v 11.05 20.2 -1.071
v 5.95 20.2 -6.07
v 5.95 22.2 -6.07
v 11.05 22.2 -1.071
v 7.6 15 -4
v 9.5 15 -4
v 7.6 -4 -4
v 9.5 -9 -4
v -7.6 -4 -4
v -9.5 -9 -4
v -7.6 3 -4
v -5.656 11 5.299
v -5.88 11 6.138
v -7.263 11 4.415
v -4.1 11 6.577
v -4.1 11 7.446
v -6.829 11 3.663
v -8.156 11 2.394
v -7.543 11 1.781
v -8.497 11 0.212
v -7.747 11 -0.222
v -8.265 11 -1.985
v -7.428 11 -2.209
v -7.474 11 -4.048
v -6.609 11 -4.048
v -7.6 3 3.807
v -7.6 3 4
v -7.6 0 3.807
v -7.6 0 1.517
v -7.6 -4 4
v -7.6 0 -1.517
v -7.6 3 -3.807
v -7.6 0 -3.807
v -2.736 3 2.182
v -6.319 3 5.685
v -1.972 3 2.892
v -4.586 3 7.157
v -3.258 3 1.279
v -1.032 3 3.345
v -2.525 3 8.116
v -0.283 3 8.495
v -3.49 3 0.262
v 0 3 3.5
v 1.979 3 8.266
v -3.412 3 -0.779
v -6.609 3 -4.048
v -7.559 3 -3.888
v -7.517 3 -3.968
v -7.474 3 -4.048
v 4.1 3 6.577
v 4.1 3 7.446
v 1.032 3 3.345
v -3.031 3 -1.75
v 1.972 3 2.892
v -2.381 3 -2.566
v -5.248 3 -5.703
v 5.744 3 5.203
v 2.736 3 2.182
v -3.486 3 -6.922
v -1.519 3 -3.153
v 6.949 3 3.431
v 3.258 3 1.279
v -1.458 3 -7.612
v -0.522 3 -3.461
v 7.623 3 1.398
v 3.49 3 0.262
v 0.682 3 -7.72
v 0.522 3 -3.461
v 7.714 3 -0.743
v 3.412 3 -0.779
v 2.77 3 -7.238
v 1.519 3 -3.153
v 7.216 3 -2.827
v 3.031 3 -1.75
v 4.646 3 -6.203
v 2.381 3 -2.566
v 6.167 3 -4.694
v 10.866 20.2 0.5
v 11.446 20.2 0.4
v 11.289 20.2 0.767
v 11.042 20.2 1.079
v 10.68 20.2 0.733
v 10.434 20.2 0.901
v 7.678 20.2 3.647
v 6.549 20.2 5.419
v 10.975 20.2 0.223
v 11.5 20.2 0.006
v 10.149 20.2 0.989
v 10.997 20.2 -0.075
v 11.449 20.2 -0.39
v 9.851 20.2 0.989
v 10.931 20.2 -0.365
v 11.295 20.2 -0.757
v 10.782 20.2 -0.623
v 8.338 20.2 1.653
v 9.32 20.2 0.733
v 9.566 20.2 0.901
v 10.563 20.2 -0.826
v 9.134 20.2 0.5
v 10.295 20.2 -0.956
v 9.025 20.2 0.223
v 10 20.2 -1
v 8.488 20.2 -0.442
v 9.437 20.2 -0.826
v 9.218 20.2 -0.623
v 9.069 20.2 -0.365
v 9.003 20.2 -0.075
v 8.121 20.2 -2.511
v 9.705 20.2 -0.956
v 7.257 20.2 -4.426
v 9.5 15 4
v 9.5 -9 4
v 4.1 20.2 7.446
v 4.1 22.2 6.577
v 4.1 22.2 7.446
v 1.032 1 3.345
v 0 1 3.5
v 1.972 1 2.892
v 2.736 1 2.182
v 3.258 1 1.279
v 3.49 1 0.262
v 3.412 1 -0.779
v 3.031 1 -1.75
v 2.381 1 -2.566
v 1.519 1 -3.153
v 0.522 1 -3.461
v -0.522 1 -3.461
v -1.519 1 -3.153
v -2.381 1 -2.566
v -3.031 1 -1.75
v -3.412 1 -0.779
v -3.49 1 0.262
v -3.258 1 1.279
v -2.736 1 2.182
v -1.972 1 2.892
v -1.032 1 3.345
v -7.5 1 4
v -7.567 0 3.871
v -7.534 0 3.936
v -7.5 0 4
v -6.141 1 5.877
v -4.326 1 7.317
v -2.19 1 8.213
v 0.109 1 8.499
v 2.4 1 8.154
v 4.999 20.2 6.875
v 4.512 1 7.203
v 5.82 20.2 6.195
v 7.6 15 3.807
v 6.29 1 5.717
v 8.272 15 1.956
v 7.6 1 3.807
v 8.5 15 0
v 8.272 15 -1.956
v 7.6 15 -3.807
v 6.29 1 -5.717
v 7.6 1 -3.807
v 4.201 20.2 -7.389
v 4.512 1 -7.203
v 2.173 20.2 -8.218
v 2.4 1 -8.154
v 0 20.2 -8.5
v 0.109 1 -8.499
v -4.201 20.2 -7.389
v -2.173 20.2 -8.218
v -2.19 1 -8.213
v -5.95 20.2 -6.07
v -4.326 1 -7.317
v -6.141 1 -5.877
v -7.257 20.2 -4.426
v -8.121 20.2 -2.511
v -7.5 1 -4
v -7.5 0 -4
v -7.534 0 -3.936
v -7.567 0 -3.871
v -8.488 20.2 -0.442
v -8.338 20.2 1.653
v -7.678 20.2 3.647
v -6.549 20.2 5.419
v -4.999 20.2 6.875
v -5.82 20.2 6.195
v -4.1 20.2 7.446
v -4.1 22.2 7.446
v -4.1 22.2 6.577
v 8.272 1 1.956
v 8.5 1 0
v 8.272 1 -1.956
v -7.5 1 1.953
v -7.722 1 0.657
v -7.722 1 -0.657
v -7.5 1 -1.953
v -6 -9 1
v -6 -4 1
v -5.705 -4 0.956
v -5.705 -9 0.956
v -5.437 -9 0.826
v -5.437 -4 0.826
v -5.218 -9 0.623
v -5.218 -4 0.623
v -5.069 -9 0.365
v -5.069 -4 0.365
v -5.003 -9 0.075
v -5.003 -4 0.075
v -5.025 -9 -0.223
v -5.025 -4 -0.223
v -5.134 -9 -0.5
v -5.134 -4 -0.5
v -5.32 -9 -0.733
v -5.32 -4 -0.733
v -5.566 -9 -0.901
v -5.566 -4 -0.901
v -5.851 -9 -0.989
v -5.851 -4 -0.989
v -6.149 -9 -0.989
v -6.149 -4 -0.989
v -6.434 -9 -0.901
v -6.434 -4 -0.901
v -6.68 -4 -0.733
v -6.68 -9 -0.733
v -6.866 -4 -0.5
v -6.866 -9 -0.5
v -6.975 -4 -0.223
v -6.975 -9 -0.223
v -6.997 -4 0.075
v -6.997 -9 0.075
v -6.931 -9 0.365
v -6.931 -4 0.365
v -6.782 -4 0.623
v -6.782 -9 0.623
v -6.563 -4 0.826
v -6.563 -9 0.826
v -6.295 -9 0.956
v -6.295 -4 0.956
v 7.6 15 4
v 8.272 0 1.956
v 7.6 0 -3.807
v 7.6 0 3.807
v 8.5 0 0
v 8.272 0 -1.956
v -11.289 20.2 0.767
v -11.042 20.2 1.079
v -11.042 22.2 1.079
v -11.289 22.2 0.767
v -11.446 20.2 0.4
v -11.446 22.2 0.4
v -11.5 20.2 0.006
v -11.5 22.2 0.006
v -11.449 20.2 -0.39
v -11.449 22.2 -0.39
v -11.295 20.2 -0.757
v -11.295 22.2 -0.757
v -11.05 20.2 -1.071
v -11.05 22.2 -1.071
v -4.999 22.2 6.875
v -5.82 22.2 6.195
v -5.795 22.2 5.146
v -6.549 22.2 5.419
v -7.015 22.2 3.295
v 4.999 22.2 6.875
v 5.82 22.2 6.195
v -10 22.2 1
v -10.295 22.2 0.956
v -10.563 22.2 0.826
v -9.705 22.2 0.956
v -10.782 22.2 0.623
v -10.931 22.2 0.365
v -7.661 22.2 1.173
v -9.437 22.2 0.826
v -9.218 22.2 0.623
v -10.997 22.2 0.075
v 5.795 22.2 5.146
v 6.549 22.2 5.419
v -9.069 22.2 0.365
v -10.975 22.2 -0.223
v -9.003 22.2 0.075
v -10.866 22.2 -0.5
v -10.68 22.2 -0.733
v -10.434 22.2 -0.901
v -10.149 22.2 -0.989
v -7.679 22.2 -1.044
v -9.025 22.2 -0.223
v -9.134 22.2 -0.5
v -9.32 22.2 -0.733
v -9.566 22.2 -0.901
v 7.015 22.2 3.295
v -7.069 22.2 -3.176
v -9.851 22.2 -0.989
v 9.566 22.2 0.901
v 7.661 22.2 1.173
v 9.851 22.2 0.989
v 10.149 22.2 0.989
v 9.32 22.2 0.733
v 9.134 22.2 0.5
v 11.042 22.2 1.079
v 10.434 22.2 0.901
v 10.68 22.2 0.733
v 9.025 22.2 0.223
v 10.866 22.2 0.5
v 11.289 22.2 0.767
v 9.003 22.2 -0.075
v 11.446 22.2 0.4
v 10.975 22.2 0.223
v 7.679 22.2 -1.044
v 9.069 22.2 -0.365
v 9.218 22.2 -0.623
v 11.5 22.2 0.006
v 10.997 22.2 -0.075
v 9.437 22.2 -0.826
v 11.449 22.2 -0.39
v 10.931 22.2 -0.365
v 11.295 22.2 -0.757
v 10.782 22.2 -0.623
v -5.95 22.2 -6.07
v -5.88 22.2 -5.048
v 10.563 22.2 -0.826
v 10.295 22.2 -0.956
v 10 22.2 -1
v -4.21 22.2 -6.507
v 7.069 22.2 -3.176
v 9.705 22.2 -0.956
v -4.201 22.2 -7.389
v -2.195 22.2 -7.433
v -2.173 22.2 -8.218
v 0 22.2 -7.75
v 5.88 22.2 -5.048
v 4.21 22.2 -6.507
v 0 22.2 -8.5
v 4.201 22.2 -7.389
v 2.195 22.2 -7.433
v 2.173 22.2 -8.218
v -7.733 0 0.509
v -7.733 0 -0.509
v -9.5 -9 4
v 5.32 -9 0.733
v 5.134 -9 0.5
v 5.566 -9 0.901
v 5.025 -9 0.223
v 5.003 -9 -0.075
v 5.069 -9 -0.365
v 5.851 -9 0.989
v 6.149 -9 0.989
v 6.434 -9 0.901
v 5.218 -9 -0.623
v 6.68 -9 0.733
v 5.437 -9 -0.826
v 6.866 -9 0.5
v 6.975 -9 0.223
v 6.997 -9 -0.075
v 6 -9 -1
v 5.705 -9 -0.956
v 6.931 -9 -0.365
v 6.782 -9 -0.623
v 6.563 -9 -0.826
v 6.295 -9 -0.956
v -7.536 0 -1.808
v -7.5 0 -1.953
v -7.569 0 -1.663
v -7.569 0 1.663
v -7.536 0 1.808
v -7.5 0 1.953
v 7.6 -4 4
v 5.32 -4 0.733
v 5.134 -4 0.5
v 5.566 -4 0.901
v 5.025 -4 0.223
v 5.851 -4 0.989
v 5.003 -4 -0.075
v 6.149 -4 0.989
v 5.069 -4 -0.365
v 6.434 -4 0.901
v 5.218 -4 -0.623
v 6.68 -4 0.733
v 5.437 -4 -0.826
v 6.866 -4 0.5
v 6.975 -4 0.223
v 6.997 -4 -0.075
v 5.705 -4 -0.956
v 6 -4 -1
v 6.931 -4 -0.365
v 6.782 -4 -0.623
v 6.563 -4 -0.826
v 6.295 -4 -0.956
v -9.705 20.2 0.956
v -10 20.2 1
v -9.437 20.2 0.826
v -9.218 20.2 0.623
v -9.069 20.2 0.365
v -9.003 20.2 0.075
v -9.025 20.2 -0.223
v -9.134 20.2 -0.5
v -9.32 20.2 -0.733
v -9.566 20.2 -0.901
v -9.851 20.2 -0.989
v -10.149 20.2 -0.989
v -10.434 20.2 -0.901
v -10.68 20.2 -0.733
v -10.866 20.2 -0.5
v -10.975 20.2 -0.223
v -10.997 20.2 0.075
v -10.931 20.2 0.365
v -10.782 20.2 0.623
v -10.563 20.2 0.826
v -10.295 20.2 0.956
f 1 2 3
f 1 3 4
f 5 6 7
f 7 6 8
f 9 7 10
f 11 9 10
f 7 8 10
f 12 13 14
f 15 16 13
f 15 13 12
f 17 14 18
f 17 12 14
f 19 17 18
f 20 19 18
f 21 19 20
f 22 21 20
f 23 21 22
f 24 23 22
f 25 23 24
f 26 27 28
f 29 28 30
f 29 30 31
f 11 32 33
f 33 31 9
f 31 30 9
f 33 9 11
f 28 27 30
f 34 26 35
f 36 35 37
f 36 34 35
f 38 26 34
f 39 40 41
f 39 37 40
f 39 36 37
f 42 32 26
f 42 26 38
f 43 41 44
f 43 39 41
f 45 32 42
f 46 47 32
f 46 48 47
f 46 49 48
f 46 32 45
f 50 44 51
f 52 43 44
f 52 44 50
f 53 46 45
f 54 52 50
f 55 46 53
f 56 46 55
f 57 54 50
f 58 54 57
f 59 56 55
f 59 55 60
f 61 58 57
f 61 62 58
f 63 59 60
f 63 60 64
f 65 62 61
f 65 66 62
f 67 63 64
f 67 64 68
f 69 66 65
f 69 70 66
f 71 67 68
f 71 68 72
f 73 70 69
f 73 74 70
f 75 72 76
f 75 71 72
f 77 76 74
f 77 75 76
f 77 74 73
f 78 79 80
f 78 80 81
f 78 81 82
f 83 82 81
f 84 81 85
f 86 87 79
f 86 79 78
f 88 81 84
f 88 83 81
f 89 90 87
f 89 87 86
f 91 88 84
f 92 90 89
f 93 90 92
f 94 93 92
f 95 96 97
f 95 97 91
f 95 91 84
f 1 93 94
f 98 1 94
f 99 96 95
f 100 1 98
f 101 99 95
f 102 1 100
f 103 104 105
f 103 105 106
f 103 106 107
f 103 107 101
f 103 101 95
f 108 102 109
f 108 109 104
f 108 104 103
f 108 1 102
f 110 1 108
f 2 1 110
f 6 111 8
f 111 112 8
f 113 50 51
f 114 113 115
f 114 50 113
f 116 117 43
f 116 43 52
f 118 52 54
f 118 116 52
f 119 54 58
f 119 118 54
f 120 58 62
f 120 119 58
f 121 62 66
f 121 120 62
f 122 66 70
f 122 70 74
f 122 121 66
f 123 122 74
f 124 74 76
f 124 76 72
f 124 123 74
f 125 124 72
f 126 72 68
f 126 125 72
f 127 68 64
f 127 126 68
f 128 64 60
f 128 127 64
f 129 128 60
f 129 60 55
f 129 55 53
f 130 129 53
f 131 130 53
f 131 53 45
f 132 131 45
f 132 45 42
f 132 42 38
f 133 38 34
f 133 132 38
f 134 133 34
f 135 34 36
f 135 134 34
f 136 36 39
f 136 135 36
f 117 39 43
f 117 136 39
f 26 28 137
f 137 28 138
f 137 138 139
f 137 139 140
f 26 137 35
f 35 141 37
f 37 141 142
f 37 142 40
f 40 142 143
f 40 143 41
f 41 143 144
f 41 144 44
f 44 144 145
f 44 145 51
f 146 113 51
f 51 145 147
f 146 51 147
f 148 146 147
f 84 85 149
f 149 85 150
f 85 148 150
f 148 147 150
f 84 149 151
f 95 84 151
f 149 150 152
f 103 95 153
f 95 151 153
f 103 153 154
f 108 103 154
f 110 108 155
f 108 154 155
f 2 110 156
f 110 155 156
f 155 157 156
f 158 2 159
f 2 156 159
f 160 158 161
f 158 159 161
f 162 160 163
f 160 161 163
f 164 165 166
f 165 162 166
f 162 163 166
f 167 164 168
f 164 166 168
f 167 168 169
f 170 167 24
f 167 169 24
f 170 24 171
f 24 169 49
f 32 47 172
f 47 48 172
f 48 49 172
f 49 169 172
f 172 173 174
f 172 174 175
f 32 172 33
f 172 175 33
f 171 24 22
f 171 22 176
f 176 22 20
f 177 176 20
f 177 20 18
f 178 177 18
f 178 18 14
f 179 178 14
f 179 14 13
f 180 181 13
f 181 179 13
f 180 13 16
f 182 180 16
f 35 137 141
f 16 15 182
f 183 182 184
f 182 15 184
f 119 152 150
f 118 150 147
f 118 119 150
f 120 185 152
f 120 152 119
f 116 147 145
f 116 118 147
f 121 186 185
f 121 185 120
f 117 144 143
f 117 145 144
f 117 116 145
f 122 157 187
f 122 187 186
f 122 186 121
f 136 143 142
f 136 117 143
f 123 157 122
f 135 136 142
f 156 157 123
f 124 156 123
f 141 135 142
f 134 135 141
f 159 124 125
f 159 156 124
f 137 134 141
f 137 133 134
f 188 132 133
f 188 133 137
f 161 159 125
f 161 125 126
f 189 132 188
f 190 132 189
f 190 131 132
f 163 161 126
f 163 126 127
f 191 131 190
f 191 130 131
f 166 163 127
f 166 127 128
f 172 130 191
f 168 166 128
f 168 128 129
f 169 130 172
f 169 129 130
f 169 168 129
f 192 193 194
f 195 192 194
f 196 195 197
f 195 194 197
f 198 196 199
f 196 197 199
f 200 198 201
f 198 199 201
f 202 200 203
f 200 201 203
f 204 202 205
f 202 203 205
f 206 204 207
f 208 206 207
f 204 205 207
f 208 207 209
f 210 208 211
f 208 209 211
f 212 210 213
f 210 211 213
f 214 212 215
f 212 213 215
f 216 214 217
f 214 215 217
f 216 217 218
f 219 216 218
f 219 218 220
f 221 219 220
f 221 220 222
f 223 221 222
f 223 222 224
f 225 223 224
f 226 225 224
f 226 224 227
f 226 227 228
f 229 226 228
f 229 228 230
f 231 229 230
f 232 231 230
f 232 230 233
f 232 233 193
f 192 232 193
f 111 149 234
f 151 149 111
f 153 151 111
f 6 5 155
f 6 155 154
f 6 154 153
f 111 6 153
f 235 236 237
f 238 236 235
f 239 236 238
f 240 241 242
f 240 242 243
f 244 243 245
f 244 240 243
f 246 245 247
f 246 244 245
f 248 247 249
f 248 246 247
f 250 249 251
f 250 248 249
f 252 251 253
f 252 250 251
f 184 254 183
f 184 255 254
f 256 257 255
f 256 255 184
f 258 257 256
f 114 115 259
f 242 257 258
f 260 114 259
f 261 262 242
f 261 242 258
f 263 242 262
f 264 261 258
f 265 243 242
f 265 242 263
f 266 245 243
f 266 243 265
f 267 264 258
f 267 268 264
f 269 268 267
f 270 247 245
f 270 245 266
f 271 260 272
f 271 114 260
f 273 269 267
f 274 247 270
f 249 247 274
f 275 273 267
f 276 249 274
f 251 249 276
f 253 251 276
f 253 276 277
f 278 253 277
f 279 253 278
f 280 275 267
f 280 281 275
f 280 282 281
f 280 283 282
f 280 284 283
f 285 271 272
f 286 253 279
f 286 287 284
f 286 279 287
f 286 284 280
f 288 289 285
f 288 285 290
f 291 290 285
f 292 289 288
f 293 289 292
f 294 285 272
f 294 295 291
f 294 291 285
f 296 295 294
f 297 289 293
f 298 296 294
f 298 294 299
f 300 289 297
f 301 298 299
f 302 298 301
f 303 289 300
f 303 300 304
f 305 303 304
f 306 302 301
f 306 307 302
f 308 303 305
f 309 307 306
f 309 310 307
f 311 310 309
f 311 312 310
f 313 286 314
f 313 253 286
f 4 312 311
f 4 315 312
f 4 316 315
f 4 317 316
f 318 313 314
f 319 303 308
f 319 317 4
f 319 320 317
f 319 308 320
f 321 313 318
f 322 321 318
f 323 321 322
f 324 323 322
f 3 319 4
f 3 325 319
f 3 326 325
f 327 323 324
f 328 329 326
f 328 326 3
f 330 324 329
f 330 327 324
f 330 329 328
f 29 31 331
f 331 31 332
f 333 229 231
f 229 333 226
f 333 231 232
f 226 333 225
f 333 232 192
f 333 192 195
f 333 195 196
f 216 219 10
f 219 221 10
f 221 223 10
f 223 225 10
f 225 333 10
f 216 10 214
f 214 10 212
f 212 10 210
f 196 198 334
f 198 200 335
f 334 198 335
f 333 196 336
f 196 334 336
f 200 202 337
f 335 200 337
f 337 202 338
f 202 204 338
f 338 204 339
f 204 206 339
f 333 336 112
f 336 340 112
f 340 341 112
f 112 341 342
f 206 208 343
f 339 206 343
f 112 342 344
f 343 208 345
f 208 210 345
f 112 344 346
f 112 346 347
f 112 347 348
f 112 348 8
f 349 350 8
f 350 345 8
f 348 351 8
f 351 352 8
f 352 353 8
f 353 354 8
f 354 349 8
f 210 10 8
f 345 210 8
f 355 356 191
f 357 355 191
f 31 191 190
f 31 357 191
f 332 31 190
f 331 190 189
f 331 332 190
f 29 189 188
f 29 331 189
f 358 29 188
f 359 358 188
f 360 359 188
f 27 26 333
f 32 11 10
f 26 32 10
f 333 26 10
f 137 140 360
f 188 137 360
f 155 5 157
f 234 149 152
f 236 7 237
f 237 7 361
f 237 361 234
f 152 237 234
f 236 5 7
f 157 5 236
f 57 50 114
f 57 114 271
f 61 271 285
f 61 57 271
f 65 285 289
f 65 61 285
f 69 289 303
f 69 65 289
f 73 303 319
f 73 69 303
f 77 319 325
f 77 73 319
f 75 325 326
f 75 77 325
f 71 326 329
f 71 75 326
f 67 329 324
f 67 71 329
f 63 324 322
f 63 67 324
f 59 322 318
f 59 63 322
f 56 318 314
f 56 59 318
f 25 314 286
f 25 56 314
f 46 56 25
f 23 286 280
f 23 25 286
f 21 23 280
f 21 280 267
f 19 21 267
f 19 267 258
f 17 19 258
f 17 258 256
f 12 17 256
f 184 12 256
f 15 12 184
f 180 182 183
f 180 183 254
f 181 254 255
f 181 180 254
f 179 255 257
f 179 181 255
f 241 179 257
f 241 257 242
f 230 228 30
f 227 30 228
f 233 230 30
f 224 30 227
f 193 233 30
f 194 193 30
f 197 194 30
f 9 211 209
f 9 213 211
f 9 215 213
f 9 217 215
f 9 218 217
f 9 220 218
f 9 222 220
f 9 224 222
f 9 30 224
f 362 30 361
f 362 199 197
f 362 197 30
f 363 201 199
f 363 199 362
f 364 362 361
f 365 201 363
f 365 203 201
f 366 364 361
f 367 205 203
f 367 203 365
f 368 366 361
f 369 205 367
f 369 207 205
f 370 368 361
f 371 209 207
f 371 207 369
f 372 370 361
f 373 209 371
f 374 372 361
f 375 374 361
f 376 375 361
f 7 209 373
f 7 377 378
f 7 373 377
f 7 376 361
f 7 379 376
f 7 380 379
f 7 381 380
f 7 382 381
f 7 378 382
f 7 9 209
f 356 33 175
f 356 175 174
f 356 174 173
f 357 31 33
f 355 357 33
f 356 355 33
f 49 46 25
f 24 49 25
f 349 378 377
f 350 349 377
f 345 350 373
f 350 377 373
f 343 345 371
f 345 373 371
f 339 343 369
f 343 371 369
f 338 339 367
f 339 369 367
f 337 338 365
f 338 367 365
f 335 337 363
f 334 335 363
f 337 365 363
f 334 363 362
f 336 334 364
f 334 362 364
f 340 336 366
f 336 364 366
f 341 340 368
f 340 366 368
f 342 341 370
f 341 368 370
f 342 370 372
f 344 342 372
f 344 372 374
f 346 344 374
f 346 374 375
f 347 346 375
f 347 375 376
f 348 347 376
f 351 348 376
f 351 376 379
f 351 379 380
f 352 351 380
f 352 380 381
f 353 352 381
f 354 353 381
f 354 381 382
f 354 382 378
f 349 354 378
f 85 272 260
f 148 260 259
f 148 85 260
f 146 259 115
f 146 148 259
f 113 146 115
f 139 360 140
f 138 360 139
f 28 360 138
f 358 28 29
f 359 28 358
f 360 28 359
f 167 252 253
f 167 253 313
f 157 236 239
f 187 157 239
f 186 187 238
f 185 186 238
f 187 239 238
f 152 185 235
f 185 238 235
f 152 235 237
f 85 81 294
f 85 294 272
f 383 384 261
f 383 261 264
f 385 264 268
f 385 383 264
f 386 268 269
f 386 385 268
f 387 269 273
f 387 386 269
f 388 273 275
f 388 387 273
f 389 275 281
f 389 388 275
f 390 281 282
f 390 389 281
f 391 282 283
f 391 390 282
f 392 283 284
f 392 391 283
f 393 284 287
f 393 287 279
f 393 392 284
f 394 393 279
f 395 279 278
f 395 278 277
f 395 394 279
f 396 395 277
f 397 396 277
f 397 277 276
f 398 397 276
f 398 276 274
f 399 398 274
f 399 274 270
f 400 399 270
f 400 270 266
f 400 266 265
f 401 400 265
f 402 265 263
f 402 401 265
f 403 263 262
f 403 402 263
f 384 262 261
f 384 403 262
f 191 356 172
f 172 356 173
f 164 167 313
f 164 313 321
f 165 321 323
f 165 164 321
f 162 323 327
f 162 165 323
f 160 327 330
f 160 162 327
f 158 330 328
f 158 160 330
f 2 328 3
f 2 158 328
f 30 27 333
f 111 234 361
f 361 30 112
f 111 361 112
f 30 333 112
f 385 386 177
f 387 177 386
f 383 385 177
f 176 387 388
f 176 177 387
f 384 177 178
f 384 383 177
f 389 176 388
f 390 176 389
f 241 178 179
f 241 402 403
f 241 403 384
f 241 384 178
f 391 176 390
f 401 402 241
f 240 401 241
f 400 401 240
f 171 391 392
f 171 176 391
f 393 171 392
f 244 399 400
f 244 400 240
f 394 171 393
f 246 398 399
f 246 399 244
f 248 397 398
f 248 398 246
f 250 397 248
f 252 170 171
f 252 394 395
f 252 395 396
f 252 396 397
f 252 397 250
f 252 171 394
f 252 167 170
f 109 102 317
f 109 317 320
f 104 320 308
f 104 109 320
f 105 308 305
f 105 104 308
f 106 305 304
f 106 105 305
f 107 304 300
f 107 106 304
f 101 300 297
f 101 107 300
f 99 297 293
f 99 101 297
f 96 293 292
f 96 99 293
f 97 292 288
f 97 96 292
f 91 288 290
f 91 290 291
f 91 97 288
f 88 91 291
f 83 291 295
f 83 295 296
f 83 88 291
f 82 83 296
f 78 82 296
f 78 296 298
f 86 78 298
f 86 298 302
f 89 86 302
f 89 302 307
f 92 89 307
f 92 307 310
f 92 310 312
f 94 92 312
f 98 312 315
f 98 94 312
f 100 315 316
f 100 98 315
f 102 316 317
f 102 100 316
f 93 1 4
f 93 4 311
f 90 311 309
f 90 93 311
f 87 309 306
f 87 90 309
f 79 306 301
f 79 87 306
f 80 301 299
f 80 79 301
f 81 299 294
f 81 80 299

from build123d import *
from build123d.topology import SkipClean

# Parameters (mm, degrees)
SKETCH_2_W                = 19
SKETCH_2_H                = 8
EXTRUDE_1_DEPTH           = 9
SKETCH_4_R                = 8.5
EXTRUDE_2_DEPTH           = 22.2
CUT_EXTRUDE_5_REACH       = 27.6
SKETCH_5_2_R              = 7.75
EXTRUDE_START             = -2
SKETCH_9_R                = 1
EXTRUDE_4_DEPTH           = 2
SKETCH_5_R                = 7.75
CUT_EXTRUDE_8_DEPTH       = 27.407196
SKETCH_11_W               = 15.2
SKETCH_11_H               = 8
CUT_EXTRUDE_11_DEPTH      = 4
SKETCH_12_W               = 8.2
SKETCH_12_H               = 22.2
CUT_EXTRUDE_12_DEPTH      = 27.407196
SKETCH_13_W               = 11.493961
SKETCH_13_H               = 8
CUT_EXTRUDE_13_DEPTH      = 27.407196
EXTRUDE_6_DEPTH           = 3
EXTRUDE_7_DEPTH           = 15
SKETCH_16_R               = 1
CUT_EXTRUDE_14_DEPTH      = 30.848618
SKETCH_17_R               = 8.5
SKETCH_17_R_2             = 3.5
EXTRUDE_8_DEPTH           = 2
CUT_EXTRUDE_15_DEPTH      = 27.407196
CUT_EXTRUDE_15_DEPTH_BACK = 27.407196
CUT_EXTRUDE_17_DEPTH      = 1


with BuildPart() as part:
    # 草图2 → 凸台-拉伸1 (new body)
    with BuildSketch(Plane(origin=(0, 0, 0), x_dir=(1, 0, 0), z_dir=(0, 1, 0))):
        Rectangle(SKETCH_2_W, SKETCH_2_H)
    extrude(amount=-EXTRUDE_1_DEPTH)

    # 草图4 → 凸台-拉伸2 (add)
    with BuildSketch(Plane(origin=(0, 0, 0), x_dir=(1, 0, 0), z_dir=(0, 1, 0))):
        Circle(SKETCH_4_R)
    extrude(amount=EXTRUDE_2_DEPTH)

    # 草图5<2> → 切除-拉伸5 (cut, up to next)
    with BuildSketch(Plane(origin=(0, 0, 0), x_dir=(1, 0, 0), z_dir=(0, 1, 0)), mode=Mode.PRIVATE) as cut_extrude_5_sk1:
        Circle(SKETCH_5_2_R)
    cut_extrude_5_tool1 = extrude(cut_extrude_5_sk1.sketch, amount=CUT_EXTRUDE_5_REACH, mode=Mode.PRIVATE) & part.part
    add(cut_extrude_5_tool1.solids().sort_by_distance((0, 0, 0))[0], mode=Mode.SUBTRACT)

    # 草图9 → 凸台-拉伸4 (add)
    with SkipClean():  # the faces are left unmerged after this step: merging them gives an invalid solid
        with BuildSketch(Plane(origin=(0, 22.2, 0), x_dir=(1, 0, 0), z_dir=(0, 1, 0)).offset(EXTRUDE_START)):
            with BuildLine():
                Line((-11.05, 1.071214), (-5.95, 6.070214))
                ThreePointArc((-5.95, 6.070214), (0, 8.5), (5.95, 6.070214))
                Line((5.95, 6.070214), (11.05, 1.071214))
                ThreePointArc((11.05, 1.071214), (11.49999, -0.005522), (11.042085, -1.078916))
                Line((11.042085, -1.078916), (6.548688, -5.418919))
                ThreePointArc((6.548688, -5.418919), (0, -8.5), (-6.548688, -5.418919))
                Line((-6.548688, -5.418919), (-11.042085, -1.078916))
                ThreePointArc((-11.042085, -1.078916), (-11.49999, -0.005522), (-11.05, 1.071214))
            make_face()
            with Locations((-10, 0)):
                Circle(SKETCH_9_R, mode=Mode.SUBTRACT)
            with Locations((10, 0)):
                Circle(SKETCH_9_R, mode=Mode.SUBTRACT)
        extrude(amount=EXTRUDE_4_DEPTH)

    # 草图5 → 切除-拉伸8 (cut, through all)
    with SkipClean():  # the faces are left unmerged after this step: merging them gives an invalid solid
        with BuildSketch(Plane(origin=(0, 0, 0), x_dir=(1, 0, 0), z_dir=(0, 1, 0))):
            Circle(SKETCH_5_R)
        extrude(amount=CUT_EXTRUDE_8_DEPTH, mode=Mode.SUBTRACT)

    # 草图11 → 切除-拉伸11 (cut)
    with SkipClean():  # the faces are left unmerged after this step: merging them gives an invalid solid
        with BuildSketch(Plane(origin=(0, 0, 0), x_dir=(1, 0, 0), z_dir=(0, 1, 0))):
            Rectangle(SKETCH_11_W, SKETCH_11_H)
        extrude(amount=-CUT_EXTRUDE_11_DEPTH, mode=Mode.SUBTRACT)

    # 草图12 → 切除-拉伸12 (cut, through all)
    with SkipClean():  # the faces are left unmerged after this step: merging them gives an invalid solid
        with BuildSketch(Plane.XY):
            with Locations((0, 11.1)):
                Rectangle(SKETCH_12_W, SKETCH_12_H)
        extrude(amount=CUT_EXTRUDE_12_DEPTH, mode=Mode.SUBTRACT)

    # 草图13 → 切除-拉伸13 (cut, through all)
    with SkipClean():  # the faces are left unmerged after this step: merging them gives an invalid solid
        with BuildSketch(Plane(origin=(0, 0, 0), x_dir=(0, 0, -1), z_dir=(1, 0, 0))):
            with Locations((-1.698824, 7)):
                Rectangle(SKETCH_13_W, SKETCH_13_H)
        extrude(amount=-CUT_EXTRUDE_13_DEPTH, mode=Mode.SUBTRACT)

    # 草图14 → 凸台-拉伸6 (add)
    with BuildSketch(Plane(origin=(0, 0, 0), x_dir=(1, 0, 0), z_dir=(0, 1, 0))):
        with BuildLine():
            Line((-7.6, 3.806573), (-7.6, 4))
            Line((-7.6, 4), (-9.5, 4))
            Line((-9.5, 4), (-9.5, -4))
            Line((-9.5, -4), (-7.6, -4))
            Line((-7.6, -4), (-7.6, -3.806573))
            ThreePointArc((-7.6, -3.806573), (-8.5, 0), (-7.6, 3.806573))
        make_face()
    extrude(amount=EXTRUDE_6_DEPTH)

    # 草图15 → 凸台-拉伸7 (add)
    with SkipClean():  # the faces are left unmerged after this step: merging them gives an invalid solid
        with BuildSketch(Plane(origin=(0, 0, 0), x_dir=(1, 0, 0), z_dir=(0, 1, 0))):
            with BuildLine():
                Line((7.6, -3.806573), (7.6, -4))
                Line((7.6, -4), (9.5, -4))
                Line((9.5, -4), (9.5, 4))
                Line((9.5, 4), (7.6, 4))
                Line((7.6, 4), (7.6, 3.806573))
                ThreePointArc((7.6, 3.806573), (8.5, 0), (7.6, -3.806573))
            make_face()
        extrude(amount=EXTRUDE_7_DEPTH)

    # 草图16 → 切除-拉伸14 (cut, through all)
    with SkipClean():  # the faces are left unmerged after this step: merging them gives an invalid solid
        with BuildSketch(Plane(origin=(0, -4, 0), x_dir=(1, 0, 0), z_dir=(0, 1, 0))):
            with Locations((-6, 0)):
                Circle(SKETCH_16_R)
            with Locations((6, 0)):
                Circle(SKETCH_16_R)
        extrude(amount=-CUT_EXTRUDE_14_DEPTH, mode=Mode.SUBTRACT)

    # 草图17 → 凸台-拉伸8 (add)
    with BuildSketch(Plane(origin=(0, 3, 0), x_dir=(1, 0, 0), z_dir=(0, 1, 0)).offset(EXTRUDE_START)):
        Circle(SKETCH_17_R)
        Circle(SKETCH_17_R_2, mode=Mode.SUBTRACT)
    extrude(amount=EXTRUDE_8_DEPTH)

    # 草图18 → 切除-拉伸15 (cut, two sides: drawn at the far end of the back side and taken through both)
    with BuildSketch(Plane.XY.offset(-CUT_EXTRUDE_15_DEPTH_BACK)):
        Polygon((-7.6, 3), (-9.5, -9), (-9.5, 3), align=None)
    extrude(amount=CUT_EXTRUDE_15_DEPTH + CUT_EXTRUDE_15_DEPTH_BACK, mode=Mode.SUBTRACT)

    # 草图19 → 切除-拉伸17 (cut)
    with BuildSketch(Plane(origin=(0, 0, 0), x_dir=(1, 0, 0), z_dir=(0, 1, 0))):
        with BuildLine():
            Line((-7.5, -4), (-7.5, 4))
            ThreePointArc((-7.5, 4), (8.5, 0), (-7.5, -4))
        make_face()
    extrude(amount=CUT_EXTRUDE_17_DEPTH, mode=Mode.SUBTRACT)


solid = part.part
